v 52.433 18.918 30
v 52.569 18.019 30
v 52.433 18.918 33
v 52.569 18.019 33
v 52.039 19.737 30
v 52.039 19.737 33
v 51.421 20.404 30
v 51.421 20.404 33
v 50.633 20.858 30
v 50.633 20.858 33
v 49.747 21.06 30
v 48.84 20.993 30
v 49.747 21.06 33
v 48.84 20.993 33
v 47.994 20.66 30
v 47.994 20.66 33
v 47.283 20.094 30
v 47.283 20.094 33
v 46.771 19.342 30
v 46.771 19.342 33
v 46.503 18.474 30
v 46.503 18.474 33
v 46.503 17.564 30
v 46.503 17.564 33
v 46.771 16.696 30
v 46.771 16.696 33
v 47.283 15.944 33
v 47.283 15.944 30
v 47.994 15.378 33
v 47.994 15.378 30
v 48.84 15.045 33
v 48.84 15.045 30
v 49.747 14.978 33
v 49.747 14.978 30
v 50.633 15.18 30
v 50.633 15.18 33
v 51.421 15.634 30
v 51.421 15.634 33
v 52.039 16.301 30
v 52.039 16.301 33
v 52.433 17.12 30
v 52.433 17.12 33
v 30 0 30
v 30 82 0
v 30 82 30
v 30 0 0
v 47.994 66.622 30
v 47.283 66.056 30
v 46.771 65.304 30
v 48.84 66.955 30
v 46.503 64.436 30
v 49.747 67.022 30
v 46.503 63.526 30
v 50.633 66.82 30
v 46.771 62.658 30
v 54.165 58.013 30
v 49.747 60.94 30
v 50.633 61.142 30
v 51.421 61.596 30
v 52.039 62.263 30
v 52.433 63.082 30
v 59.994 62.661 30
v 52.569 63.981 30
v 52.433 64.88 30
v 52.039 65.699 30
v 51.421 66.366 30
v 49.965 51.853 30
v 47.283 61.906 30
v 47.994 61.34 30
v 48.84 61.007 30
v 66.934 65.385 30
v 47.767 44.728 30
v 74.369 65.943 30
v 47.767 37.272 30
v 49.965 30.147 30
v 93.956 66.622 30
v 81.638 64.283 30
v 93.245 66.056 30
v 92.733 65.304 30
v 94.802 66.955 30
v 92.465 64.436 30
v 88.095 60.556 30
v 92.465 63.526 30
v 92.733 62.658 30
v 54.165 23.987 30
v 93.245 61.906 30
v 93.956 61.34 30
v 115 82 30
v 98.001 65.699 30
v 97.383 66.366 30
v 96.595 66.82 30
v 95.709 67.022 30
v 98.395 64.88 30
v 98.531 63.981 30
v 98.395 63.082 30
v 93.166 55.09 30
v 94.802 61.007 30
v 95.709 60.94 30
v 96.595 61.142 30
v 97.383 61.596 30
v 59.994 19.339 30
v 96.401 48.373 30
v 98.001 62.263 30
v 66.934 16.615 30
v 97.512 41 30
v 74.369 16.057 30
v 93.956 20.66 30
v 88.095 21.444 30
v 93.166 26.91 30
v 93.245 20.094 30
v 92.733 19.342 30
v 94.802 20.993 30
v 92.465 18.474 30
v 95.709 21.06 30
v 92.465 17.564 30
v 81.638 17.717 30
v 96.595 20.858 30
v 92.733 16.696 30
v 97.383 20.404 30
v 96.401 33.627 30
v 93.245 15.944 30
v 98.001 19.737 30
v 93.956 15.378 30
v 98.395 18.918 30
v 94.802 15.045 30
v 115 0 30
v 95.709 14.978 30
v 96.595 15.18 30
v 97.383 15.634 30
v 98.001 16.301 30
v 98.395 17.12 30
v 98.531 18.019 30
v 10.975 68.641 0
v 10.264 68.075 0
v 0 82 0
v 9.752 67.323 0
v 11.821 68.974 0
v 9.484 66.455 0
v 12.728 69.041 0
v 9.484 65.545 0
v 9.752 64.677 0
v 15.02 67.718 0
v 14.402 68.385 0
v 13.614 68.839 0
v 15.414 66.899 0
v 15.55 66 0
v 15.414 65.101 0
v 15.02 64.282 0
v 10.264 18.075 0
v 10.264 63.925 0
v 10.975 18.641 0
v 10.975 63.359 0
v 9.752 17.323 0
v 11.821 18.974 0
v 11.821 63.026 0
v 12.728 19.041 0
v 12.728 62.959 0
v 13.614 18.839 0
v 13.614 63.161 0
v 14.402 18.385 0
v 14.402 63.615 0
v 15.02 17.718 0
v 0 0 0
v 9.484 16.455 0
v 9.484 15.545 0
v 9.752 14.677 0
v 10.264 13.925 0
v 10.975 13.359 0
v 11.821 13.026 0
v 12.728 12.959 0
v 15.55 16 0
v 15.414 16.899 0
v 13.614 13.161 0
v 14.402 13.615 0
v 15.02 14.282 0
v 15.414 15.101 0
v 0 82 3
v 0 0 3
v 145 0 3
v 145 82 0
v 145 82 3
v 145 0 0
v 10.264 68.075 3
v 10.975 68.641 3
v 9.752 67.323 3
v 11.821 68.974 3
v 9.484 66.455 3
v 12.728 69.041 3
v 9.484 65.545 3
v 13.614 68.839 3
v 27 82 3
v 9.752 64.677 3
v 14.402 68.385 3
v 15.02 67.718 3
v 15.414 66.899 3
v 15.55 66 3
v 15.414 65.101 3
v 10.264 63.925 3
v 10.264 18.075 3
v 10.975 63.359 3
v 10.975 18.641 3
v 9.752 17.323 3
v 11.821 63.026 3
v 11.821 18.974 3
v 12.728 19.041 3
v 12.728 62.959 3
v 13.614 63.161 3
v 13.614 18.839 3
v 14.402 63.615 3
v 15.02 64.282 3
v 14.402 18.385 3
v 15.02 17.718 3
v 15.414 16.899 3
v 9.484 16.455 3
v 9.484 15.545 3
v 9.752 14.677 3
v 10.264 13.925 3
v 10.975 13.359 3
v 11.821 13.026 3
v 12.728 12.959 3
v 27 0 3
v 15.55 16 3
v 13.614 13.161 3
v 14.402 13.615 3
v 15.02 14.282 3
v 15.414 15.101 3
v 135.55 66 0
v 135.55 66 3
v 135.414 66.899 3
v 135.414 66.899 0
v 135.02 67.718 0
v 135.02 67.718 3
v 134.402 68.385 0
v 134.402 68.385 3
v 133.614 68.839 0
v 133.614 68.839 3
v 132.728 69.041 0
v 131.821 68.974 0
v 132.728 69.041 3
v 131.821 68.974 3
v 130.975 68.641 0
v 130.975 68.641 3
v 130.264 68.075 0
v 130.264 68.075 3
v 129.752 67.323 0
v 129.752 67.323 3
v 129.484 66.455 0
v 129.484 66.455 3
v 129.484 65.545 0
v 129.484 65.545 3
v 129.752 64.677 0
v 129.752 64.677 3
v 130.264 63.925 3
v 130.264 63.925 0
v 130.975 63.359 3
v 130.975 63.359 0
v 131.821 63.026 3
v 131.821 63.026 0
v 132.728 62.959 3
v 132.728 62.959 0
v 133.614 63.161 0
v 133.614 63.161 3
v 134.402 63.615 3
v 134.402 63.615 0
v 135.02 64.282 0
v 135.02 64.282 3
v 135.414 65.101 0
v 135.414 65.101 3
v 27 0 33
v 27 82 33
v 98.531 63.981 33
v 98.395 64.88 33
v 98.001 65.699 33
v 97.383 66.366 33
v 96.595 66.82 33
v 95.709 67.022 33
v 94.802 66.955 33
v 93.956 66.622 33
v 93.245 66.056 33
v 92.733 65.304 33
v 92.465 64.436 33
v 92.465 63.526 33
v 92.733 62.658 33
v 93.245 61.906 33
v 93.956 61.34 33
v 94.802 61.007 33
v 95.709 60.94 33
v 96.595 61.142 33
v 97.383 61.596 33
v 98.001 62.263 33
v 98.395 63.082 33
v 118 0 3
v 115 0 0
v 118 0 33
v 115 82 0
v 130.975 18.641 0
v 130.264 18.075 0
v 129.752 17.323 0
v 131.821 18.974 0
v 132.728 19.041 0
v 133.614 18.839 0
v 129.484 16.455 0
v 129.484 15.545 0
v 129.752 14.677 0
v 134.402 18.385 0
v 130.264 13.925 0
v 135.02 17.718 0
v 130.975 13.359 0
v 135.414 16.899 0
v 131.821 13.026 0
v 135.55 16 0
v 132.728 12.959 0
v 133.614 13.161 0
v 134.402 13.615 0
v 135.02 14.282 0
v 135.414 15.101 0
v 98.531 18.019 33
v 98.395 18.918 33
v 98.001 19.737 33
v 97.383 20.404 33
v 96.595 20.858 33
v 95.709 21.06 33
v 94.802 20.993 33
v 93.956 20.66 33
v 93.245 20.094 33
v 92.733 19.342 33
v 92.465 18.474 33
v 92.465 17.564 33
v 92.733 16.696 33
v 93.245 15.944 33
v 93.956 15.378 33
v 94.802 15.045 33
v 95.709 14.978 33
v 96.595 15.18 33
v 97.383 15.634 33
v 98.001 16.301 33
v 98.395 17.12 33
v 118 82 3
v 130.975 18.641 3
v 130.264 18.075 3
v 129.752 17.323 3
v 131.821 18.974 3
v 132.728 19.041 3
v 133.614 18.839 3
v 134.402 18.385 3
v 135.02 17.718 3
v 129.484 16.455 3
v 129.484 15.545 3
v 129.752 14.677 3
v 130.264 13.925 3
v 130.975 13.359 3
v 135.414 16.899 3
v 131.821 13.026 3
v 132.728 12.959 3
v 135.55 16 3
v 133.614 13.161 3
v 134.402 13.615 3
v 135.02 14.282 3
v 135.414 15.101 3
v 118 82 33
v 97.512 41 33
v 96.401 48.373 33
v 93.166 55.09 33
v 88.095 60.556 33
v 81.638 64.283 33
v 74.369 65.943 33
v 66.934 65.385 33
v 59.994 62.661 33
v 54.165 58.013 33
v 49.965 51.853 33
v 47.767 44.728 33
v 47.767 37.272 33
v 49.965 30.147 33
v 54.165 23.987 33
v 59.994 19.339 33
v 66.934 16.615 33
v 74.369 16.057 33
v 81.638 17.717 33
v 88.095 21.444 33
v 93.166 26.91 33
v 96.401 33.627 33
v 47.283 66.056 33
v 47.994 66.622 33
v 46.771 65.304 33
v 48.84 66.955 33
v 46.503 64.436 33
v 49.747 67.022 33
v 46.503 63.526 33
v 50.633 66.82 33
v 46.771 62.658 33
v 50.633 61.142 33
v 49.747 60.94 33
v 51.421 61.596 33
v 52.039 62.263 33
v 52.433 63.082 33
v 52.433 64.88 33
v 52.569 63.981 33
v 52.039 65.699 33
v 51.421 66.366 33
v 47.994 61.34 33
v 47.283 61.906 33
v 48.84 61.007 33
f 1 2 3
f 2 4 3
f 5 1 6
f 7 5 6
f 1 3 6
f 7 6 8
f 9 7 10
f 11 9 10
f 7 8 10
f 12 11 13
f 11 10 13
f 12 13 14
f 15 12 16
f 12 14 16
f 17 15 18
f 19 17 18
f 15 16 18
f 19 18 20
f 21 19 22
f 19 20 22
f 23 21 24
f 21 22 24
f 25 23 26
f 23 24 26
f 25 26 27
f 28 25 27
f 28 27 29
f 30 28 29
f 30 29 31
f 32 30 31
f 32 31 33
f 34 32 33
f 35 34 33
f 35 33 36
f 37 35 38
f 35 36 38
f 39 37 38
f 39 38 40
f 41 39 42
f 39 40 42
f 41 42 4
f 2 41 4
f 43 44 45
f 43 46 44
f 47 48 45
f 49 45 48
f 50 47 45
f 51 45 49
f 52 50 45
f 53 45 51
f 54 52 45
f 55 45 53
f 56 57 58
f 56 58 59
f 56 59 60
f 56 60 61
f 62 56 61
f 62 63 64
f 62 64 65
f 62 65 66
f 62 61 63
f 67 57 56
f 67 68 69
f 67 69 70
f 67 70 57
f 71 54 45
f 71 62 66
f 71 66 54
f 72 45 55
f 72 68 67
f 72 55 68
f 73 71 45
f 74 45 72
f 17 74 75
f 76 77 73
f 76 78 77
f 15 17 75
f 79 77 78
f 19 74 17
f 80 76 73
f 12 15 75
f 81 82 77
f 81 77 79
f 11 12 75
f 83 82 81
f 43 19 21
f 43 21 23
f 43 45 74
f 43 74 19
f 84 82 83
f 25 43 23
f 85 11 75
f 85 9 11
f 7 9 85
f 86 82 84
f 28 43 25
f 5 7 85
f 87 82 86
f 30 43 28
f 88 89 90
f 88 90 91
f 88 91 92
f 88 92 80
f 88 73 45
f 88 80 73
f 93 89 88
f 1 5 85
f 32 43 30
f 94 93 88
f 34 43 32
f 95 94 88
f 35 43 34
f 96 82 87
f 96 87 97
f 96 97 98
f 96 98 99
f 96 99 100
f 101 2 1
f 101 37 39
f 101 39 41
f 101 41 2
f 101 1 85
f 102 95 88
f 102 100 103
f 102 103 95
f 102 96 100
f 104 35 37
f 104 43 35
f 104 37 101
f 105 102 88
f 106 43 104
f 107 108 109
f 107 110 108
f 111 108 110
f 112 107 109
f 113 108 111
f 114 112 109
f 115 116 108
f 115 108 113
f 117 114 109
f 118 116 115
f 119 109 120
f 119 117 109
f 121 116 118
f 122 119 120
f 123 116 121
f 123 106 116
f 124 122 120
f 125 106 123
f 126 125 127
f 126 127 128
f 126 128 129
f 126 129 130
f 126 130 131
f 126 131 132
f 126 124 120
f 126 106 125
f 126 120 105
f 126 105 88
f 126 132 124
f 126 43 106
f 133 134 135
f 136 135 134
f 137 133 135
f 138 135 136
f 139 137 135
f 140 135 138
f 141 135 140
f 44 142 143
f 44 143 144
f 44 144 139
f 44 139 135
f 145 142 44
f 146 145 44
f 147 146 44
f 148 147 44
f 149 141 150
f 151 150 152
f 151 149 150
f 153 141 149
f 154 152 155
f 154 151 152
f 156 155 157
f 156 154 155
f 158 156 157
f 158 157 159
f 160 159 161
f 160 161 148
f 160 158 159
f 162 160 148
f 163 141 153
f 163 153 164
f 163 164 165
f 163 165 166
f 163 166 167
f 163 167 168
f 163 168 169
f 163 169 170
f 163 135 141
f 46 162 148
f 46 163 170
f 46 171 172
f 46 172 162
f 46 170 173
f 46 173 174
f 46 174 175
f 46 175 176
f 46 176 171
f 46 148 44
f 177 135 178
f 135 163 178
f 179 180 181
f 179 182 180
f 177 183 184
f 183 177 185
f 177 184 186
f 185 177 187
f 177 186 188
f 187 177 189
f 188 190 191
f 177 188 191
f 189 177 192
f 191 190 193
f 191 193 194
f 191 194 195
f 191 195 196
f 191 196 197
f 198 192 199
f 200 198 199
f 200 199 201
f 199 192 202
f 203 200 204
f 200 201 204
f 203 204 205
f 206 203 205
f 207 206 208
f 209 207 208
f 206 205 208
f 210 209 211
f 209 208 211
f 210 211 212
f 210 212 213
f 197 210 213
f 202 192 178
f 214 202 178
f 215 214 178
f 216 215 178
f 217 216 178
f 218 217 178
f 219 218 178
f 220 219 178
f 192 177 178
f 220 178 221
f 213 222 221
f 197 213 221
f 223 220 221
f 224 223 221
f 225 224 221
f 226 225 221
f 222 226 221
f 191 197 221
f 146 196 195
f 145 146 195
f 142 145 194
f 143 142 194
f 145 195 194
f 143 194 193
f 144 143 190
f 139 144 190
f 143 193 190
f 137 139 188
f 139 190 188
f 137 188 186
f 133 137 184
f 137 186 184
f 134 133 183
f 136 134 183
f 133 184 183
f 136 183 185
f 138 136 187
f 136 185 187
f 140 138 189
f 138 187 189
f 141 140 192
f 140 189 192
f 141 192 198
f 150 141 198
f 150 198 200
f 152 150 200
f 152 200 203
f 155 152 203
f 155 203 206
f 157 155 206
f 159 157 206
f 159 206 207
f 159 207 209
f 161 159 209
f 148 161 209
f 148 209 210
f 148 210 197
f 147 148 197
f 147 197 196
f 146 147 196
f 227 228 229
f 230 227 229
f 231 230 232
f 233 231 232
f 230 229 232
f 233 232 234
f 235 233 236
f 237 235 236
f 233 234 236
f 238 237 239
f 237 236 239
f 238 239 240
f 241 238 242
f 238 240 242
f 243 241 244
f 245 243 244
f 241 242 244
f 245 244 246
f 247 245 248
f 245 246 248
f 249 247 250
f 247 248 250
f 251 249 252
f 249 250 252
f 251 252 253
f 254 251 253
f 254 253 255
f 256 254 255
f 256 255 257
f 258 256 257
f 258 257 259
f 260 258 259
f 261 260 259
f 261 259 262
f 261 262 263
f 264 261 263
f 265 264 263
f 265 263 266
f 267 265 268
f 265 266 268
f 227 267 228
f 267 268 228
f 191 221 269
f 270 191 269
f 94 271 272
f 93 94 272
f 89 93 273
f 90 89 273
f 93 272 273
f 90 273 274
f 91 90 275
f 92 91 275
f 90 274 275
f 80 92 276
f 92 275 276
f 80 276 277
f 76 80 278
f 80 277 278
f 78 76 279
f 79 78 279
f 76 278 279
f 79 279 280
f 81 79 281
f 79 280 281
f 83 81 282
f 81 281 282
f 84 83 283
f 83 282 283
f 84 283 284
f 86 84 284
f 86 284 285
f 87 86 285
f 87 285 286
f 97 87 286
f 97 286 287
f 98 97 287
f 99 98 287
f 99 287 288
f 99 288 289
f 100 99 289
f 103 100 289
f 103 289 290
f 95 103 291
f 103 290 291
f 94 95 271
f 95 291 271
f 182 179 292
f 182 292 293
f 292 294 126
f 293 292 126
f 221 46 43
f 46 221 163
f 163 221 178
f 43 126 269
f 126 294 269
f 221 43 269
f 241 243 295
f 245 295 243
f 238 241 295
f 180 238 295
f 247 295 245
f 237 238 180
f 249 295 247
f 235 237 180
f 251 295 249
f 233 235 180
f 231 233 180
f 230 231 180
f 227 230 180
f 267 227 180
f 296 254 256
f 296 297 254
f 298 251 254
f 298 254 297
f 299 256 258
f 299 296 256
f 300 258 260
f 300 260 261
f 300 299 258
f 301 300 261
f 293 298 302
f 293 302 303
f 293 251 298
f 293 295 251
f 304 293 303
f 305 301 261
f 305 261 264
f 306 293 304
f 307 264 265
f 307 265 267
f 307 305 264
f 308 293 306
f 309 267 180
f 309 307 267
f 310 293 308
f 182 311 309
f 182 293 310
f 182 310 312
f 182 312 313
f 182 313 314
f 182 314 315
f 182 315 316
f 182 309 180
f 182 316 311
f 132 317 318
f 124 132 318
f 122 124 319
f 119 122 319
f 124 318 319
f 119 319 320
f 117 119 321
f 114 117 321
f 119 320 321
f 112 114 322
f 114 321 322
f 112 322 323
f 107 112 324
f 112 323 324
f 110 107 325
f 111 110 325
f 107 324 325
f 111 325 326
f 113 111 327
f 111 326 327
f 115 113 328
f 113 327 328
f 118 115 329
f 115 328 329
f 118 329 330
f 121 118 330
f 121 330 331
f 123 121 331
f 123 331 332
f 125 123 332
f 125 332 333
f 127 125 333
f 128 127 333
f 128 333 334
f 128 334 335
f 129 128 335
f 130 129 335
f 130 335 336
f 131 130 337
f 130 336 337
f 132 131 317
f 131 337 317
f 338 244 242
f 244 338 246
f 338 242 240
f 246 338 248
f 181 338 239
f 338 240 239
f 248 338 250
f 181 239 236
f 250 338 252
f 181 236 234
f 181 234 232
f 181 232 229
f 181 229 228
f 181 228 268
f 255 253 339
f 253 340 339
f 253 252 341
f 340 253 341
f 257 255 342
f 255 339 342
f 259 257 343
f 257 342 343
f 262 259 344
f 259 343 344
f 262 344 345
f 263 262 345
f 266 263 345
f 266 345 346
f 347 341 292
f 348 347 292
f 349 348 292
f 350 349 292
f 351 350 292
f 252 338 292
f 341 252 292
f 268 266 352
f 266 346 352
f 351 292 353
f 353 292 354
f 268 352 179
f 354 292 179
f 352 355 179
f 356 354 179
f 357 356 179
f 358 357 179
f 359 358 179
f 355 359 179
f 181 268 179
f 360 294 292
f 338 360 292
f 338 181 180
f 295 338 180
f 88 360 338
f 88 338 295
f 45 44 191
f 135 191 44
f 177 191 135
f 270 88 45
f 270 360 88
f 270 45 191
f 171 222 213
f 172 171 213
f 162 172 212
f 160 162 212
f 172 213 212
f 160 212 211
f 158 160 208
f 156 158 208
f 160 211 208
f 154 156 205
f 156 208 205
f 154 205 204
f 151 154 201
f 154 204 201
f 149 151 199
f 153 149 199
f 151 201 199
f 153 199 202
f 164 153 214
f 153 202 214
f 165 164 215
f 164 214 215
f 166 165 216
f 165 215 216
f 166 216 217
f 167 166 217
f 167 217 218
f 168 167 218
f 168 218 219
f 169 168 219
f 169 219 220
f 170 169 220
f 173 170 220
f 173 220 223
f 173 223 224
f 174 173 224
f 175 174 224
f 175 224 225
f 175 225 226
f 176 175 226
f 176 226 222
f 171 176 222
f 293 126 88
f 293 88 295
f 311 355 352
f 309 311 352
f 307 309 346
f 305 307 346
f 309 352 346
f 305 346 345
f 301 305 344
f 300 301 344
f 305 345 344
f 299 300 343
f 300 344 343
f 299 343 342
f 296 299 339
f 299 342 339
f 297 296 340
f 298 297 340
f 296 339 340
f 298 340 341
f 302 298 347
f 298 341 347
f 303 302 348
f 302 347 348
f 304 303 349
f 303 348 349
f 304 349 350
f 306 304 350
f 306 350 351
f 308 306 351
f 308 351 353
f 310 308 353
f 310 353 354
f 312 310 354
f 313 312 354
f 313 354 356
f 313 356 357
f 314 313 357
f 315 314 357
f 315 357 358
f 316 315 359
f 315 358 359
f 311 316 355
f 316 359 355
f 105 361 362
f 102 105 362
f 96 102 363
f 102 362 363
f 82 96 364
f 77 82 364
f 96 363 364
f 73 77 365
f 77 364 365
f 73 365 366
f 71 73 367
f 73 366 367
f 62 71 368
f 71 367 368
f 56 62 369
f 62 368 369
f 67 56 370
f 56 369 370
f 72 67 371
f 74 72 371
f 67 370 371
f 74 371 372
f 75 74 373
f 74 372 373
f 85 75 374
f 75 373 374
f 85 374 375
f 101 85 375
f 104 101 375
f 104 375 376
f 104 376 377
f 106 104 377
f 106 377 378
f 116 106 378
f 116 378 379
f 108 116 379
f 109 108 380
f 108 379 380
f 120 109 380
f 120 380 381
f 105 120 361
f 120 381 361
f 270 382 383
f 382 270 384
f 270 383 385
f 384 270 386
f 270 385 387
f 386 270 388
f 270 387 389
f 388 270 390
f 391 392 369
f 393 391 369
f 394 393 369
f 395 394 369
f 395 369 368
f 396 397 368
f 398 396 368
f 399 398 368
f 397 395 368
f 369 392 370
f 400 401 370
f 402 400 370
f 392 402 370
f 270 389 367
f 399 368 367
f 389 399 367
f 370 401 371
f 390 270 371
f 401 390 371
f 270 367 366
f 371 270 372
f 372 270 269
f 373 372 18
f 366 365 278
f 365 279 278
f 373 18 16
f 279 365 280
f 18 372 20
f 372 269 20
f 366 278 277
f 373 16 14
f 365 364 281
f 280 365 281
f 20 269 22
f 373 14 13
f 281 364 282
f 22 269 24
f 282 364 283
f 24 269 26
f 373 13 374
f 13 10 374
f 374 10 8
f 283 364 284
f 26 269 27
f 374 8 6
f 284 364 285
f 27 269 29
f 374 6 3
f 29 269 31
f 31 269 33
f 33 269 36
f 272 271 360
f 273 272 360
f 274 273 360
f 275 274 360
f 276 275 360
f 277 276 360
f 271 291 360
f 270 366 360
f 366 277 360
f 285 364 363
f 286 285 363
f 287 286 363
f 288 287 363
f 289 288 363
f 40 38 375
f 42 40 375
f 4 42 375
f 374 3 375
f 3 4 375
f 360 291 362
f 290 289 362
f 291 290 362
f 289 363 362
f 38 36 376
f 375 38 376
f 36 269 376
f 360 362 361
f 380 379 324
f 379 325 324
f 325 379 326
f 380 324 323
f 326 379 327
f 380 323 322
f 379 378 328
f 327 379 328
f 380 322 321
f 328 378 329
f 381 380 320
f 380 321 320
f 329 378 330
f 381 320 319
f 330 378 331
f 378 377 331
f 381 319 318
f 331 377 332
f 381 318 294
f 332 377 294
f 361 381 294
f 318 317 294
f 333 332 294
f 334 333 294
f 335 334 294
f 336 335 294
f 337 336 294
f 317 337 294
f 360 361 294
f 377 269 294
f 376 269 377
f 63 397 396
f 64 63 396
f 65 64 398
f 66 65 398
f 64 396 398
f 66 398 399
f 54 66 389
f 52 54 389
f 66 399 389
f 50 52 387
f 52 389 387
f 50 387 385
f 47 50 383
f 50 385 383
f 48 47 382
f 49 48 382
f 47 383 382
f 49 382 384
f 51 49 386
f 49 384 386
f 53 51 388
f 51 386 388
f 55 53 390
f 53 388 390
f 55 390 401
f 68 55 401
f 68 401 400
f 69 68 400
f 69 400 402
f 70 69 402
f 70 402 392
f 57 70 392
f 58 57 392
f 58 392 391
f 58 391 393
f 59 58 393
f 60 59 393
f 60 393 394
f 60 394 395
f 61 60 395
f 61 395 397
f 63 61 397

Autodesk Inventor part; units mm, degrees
ref_plane "YZ Plane" through (0, 0, 0) normal (1, 0, 0) x (0, 1, 0)
ref_plane "XZ Plane" through (0, 0, 0) normal (0, 1, 0) x (-1, 0, 0)
ref_plane "XY Plane" through (0, 0, 0) normal (0, 0, 1) x (1, 0, 0)
sketch "Sketch1" plane through (0, 0, 0) normal (0, 1, 0) x (-1, 0, 0)
  line L0 (0, 0) -> (-30, 0)
  line L1 (-30, 0) -> (-30, 30)
  line L2 (-30, 30) -> (-115, 30)
  line L3 (-115, 30) -> (-115, 0)
  line L4 (-115, 0) -> (-145, 0)
  line L5 (0, 3) -> (-27, 3)
  line L6 (-27, 3) -> (-27, 33)
  line L7 (-27, 33) -> (-118, 33)
  line L8 (-118, 33) -> (-118, 3)
  line L9 (-118, 3) -> (-145, 3)
  line L10 (0, 0) -> (0, 3)
  line L11 (-145, 0) -> (-145, 3)
  dimension "d0" = 30
  dimension "d1" = 30
  dimension "d2" = 3
  dimension "d28" = 85
extrude "Extrusion1" add sketch "Sketch1" along normal blind 82
sketch "Sketch2" plane through (27, 0, 33) normal (0, 0, 1) x (1, 0, 0)
  line L0 (0, 82) -> (91, 82) projected
  line L1 (45.5, 82) -> (45.5, 0) construction
  line L2 (0, 0) -> (91, 0) projected
  circle A0 centre (45.5, 41) radius 32.5 construction
  line L3 (45.5, 41) -> (68.481, 63.981) construction
  circle A1 centre (68.481, 63.981) radius 3.05
  circle A2 centre (22.519, 63.981) radius 3.05
  circle A3 centre (22.519, 18.019) radius 3.05
  circle A4 centre (68.481, 18.019) radius 3.05
  circle A5 centre (45.5, 41) radius 25.0125
  point P0 (-27, 0)
  dimension "d6" = 65
  dimension "d7" = 6.1
  dimension "d8" = 45
  dimension "d11" = 360
  dimension "d15" = 50.025
extrude "Extrusion2" cut sketch "Sketch2" against normal blind 82
sketch "Sketch3" plane through (0, 0, 3) normal (0, 0, 1) x (1, 0, 0)
  circle A0 centre (72.5, 41) radius 25.0125 construction
  line L0 (12.5, 66) -> (132.5, 66) construction
  line L1 (132.5, 66) -> (132.5, 16) construction
  line L2 (132.5, 16) -> (12.5, 16) construction
  line L3 (12.5, 16) -> (12.5, 66) construction
  line L4 (12.5, 66) -> (132.5, 16) construction
  line L5 (132.5, 66) -> (12.5, 16) construction
  circle A1 centre (12.5, 66) radius 3.05
  circle A2 centre (12.5, 16) radius 3.05
  circle A3 centre (132.5, 66) radius 3.05
  circle A4 centre (132.5, 16) radius 3.05
  dimension "d29" = 6.1
  dimension "d30" = 120
  dimension "d31" = 50
extrude "Extrusion3" cut sketch "Sketch3" against normal blind 10
properties part number "TopMotorBracket"
